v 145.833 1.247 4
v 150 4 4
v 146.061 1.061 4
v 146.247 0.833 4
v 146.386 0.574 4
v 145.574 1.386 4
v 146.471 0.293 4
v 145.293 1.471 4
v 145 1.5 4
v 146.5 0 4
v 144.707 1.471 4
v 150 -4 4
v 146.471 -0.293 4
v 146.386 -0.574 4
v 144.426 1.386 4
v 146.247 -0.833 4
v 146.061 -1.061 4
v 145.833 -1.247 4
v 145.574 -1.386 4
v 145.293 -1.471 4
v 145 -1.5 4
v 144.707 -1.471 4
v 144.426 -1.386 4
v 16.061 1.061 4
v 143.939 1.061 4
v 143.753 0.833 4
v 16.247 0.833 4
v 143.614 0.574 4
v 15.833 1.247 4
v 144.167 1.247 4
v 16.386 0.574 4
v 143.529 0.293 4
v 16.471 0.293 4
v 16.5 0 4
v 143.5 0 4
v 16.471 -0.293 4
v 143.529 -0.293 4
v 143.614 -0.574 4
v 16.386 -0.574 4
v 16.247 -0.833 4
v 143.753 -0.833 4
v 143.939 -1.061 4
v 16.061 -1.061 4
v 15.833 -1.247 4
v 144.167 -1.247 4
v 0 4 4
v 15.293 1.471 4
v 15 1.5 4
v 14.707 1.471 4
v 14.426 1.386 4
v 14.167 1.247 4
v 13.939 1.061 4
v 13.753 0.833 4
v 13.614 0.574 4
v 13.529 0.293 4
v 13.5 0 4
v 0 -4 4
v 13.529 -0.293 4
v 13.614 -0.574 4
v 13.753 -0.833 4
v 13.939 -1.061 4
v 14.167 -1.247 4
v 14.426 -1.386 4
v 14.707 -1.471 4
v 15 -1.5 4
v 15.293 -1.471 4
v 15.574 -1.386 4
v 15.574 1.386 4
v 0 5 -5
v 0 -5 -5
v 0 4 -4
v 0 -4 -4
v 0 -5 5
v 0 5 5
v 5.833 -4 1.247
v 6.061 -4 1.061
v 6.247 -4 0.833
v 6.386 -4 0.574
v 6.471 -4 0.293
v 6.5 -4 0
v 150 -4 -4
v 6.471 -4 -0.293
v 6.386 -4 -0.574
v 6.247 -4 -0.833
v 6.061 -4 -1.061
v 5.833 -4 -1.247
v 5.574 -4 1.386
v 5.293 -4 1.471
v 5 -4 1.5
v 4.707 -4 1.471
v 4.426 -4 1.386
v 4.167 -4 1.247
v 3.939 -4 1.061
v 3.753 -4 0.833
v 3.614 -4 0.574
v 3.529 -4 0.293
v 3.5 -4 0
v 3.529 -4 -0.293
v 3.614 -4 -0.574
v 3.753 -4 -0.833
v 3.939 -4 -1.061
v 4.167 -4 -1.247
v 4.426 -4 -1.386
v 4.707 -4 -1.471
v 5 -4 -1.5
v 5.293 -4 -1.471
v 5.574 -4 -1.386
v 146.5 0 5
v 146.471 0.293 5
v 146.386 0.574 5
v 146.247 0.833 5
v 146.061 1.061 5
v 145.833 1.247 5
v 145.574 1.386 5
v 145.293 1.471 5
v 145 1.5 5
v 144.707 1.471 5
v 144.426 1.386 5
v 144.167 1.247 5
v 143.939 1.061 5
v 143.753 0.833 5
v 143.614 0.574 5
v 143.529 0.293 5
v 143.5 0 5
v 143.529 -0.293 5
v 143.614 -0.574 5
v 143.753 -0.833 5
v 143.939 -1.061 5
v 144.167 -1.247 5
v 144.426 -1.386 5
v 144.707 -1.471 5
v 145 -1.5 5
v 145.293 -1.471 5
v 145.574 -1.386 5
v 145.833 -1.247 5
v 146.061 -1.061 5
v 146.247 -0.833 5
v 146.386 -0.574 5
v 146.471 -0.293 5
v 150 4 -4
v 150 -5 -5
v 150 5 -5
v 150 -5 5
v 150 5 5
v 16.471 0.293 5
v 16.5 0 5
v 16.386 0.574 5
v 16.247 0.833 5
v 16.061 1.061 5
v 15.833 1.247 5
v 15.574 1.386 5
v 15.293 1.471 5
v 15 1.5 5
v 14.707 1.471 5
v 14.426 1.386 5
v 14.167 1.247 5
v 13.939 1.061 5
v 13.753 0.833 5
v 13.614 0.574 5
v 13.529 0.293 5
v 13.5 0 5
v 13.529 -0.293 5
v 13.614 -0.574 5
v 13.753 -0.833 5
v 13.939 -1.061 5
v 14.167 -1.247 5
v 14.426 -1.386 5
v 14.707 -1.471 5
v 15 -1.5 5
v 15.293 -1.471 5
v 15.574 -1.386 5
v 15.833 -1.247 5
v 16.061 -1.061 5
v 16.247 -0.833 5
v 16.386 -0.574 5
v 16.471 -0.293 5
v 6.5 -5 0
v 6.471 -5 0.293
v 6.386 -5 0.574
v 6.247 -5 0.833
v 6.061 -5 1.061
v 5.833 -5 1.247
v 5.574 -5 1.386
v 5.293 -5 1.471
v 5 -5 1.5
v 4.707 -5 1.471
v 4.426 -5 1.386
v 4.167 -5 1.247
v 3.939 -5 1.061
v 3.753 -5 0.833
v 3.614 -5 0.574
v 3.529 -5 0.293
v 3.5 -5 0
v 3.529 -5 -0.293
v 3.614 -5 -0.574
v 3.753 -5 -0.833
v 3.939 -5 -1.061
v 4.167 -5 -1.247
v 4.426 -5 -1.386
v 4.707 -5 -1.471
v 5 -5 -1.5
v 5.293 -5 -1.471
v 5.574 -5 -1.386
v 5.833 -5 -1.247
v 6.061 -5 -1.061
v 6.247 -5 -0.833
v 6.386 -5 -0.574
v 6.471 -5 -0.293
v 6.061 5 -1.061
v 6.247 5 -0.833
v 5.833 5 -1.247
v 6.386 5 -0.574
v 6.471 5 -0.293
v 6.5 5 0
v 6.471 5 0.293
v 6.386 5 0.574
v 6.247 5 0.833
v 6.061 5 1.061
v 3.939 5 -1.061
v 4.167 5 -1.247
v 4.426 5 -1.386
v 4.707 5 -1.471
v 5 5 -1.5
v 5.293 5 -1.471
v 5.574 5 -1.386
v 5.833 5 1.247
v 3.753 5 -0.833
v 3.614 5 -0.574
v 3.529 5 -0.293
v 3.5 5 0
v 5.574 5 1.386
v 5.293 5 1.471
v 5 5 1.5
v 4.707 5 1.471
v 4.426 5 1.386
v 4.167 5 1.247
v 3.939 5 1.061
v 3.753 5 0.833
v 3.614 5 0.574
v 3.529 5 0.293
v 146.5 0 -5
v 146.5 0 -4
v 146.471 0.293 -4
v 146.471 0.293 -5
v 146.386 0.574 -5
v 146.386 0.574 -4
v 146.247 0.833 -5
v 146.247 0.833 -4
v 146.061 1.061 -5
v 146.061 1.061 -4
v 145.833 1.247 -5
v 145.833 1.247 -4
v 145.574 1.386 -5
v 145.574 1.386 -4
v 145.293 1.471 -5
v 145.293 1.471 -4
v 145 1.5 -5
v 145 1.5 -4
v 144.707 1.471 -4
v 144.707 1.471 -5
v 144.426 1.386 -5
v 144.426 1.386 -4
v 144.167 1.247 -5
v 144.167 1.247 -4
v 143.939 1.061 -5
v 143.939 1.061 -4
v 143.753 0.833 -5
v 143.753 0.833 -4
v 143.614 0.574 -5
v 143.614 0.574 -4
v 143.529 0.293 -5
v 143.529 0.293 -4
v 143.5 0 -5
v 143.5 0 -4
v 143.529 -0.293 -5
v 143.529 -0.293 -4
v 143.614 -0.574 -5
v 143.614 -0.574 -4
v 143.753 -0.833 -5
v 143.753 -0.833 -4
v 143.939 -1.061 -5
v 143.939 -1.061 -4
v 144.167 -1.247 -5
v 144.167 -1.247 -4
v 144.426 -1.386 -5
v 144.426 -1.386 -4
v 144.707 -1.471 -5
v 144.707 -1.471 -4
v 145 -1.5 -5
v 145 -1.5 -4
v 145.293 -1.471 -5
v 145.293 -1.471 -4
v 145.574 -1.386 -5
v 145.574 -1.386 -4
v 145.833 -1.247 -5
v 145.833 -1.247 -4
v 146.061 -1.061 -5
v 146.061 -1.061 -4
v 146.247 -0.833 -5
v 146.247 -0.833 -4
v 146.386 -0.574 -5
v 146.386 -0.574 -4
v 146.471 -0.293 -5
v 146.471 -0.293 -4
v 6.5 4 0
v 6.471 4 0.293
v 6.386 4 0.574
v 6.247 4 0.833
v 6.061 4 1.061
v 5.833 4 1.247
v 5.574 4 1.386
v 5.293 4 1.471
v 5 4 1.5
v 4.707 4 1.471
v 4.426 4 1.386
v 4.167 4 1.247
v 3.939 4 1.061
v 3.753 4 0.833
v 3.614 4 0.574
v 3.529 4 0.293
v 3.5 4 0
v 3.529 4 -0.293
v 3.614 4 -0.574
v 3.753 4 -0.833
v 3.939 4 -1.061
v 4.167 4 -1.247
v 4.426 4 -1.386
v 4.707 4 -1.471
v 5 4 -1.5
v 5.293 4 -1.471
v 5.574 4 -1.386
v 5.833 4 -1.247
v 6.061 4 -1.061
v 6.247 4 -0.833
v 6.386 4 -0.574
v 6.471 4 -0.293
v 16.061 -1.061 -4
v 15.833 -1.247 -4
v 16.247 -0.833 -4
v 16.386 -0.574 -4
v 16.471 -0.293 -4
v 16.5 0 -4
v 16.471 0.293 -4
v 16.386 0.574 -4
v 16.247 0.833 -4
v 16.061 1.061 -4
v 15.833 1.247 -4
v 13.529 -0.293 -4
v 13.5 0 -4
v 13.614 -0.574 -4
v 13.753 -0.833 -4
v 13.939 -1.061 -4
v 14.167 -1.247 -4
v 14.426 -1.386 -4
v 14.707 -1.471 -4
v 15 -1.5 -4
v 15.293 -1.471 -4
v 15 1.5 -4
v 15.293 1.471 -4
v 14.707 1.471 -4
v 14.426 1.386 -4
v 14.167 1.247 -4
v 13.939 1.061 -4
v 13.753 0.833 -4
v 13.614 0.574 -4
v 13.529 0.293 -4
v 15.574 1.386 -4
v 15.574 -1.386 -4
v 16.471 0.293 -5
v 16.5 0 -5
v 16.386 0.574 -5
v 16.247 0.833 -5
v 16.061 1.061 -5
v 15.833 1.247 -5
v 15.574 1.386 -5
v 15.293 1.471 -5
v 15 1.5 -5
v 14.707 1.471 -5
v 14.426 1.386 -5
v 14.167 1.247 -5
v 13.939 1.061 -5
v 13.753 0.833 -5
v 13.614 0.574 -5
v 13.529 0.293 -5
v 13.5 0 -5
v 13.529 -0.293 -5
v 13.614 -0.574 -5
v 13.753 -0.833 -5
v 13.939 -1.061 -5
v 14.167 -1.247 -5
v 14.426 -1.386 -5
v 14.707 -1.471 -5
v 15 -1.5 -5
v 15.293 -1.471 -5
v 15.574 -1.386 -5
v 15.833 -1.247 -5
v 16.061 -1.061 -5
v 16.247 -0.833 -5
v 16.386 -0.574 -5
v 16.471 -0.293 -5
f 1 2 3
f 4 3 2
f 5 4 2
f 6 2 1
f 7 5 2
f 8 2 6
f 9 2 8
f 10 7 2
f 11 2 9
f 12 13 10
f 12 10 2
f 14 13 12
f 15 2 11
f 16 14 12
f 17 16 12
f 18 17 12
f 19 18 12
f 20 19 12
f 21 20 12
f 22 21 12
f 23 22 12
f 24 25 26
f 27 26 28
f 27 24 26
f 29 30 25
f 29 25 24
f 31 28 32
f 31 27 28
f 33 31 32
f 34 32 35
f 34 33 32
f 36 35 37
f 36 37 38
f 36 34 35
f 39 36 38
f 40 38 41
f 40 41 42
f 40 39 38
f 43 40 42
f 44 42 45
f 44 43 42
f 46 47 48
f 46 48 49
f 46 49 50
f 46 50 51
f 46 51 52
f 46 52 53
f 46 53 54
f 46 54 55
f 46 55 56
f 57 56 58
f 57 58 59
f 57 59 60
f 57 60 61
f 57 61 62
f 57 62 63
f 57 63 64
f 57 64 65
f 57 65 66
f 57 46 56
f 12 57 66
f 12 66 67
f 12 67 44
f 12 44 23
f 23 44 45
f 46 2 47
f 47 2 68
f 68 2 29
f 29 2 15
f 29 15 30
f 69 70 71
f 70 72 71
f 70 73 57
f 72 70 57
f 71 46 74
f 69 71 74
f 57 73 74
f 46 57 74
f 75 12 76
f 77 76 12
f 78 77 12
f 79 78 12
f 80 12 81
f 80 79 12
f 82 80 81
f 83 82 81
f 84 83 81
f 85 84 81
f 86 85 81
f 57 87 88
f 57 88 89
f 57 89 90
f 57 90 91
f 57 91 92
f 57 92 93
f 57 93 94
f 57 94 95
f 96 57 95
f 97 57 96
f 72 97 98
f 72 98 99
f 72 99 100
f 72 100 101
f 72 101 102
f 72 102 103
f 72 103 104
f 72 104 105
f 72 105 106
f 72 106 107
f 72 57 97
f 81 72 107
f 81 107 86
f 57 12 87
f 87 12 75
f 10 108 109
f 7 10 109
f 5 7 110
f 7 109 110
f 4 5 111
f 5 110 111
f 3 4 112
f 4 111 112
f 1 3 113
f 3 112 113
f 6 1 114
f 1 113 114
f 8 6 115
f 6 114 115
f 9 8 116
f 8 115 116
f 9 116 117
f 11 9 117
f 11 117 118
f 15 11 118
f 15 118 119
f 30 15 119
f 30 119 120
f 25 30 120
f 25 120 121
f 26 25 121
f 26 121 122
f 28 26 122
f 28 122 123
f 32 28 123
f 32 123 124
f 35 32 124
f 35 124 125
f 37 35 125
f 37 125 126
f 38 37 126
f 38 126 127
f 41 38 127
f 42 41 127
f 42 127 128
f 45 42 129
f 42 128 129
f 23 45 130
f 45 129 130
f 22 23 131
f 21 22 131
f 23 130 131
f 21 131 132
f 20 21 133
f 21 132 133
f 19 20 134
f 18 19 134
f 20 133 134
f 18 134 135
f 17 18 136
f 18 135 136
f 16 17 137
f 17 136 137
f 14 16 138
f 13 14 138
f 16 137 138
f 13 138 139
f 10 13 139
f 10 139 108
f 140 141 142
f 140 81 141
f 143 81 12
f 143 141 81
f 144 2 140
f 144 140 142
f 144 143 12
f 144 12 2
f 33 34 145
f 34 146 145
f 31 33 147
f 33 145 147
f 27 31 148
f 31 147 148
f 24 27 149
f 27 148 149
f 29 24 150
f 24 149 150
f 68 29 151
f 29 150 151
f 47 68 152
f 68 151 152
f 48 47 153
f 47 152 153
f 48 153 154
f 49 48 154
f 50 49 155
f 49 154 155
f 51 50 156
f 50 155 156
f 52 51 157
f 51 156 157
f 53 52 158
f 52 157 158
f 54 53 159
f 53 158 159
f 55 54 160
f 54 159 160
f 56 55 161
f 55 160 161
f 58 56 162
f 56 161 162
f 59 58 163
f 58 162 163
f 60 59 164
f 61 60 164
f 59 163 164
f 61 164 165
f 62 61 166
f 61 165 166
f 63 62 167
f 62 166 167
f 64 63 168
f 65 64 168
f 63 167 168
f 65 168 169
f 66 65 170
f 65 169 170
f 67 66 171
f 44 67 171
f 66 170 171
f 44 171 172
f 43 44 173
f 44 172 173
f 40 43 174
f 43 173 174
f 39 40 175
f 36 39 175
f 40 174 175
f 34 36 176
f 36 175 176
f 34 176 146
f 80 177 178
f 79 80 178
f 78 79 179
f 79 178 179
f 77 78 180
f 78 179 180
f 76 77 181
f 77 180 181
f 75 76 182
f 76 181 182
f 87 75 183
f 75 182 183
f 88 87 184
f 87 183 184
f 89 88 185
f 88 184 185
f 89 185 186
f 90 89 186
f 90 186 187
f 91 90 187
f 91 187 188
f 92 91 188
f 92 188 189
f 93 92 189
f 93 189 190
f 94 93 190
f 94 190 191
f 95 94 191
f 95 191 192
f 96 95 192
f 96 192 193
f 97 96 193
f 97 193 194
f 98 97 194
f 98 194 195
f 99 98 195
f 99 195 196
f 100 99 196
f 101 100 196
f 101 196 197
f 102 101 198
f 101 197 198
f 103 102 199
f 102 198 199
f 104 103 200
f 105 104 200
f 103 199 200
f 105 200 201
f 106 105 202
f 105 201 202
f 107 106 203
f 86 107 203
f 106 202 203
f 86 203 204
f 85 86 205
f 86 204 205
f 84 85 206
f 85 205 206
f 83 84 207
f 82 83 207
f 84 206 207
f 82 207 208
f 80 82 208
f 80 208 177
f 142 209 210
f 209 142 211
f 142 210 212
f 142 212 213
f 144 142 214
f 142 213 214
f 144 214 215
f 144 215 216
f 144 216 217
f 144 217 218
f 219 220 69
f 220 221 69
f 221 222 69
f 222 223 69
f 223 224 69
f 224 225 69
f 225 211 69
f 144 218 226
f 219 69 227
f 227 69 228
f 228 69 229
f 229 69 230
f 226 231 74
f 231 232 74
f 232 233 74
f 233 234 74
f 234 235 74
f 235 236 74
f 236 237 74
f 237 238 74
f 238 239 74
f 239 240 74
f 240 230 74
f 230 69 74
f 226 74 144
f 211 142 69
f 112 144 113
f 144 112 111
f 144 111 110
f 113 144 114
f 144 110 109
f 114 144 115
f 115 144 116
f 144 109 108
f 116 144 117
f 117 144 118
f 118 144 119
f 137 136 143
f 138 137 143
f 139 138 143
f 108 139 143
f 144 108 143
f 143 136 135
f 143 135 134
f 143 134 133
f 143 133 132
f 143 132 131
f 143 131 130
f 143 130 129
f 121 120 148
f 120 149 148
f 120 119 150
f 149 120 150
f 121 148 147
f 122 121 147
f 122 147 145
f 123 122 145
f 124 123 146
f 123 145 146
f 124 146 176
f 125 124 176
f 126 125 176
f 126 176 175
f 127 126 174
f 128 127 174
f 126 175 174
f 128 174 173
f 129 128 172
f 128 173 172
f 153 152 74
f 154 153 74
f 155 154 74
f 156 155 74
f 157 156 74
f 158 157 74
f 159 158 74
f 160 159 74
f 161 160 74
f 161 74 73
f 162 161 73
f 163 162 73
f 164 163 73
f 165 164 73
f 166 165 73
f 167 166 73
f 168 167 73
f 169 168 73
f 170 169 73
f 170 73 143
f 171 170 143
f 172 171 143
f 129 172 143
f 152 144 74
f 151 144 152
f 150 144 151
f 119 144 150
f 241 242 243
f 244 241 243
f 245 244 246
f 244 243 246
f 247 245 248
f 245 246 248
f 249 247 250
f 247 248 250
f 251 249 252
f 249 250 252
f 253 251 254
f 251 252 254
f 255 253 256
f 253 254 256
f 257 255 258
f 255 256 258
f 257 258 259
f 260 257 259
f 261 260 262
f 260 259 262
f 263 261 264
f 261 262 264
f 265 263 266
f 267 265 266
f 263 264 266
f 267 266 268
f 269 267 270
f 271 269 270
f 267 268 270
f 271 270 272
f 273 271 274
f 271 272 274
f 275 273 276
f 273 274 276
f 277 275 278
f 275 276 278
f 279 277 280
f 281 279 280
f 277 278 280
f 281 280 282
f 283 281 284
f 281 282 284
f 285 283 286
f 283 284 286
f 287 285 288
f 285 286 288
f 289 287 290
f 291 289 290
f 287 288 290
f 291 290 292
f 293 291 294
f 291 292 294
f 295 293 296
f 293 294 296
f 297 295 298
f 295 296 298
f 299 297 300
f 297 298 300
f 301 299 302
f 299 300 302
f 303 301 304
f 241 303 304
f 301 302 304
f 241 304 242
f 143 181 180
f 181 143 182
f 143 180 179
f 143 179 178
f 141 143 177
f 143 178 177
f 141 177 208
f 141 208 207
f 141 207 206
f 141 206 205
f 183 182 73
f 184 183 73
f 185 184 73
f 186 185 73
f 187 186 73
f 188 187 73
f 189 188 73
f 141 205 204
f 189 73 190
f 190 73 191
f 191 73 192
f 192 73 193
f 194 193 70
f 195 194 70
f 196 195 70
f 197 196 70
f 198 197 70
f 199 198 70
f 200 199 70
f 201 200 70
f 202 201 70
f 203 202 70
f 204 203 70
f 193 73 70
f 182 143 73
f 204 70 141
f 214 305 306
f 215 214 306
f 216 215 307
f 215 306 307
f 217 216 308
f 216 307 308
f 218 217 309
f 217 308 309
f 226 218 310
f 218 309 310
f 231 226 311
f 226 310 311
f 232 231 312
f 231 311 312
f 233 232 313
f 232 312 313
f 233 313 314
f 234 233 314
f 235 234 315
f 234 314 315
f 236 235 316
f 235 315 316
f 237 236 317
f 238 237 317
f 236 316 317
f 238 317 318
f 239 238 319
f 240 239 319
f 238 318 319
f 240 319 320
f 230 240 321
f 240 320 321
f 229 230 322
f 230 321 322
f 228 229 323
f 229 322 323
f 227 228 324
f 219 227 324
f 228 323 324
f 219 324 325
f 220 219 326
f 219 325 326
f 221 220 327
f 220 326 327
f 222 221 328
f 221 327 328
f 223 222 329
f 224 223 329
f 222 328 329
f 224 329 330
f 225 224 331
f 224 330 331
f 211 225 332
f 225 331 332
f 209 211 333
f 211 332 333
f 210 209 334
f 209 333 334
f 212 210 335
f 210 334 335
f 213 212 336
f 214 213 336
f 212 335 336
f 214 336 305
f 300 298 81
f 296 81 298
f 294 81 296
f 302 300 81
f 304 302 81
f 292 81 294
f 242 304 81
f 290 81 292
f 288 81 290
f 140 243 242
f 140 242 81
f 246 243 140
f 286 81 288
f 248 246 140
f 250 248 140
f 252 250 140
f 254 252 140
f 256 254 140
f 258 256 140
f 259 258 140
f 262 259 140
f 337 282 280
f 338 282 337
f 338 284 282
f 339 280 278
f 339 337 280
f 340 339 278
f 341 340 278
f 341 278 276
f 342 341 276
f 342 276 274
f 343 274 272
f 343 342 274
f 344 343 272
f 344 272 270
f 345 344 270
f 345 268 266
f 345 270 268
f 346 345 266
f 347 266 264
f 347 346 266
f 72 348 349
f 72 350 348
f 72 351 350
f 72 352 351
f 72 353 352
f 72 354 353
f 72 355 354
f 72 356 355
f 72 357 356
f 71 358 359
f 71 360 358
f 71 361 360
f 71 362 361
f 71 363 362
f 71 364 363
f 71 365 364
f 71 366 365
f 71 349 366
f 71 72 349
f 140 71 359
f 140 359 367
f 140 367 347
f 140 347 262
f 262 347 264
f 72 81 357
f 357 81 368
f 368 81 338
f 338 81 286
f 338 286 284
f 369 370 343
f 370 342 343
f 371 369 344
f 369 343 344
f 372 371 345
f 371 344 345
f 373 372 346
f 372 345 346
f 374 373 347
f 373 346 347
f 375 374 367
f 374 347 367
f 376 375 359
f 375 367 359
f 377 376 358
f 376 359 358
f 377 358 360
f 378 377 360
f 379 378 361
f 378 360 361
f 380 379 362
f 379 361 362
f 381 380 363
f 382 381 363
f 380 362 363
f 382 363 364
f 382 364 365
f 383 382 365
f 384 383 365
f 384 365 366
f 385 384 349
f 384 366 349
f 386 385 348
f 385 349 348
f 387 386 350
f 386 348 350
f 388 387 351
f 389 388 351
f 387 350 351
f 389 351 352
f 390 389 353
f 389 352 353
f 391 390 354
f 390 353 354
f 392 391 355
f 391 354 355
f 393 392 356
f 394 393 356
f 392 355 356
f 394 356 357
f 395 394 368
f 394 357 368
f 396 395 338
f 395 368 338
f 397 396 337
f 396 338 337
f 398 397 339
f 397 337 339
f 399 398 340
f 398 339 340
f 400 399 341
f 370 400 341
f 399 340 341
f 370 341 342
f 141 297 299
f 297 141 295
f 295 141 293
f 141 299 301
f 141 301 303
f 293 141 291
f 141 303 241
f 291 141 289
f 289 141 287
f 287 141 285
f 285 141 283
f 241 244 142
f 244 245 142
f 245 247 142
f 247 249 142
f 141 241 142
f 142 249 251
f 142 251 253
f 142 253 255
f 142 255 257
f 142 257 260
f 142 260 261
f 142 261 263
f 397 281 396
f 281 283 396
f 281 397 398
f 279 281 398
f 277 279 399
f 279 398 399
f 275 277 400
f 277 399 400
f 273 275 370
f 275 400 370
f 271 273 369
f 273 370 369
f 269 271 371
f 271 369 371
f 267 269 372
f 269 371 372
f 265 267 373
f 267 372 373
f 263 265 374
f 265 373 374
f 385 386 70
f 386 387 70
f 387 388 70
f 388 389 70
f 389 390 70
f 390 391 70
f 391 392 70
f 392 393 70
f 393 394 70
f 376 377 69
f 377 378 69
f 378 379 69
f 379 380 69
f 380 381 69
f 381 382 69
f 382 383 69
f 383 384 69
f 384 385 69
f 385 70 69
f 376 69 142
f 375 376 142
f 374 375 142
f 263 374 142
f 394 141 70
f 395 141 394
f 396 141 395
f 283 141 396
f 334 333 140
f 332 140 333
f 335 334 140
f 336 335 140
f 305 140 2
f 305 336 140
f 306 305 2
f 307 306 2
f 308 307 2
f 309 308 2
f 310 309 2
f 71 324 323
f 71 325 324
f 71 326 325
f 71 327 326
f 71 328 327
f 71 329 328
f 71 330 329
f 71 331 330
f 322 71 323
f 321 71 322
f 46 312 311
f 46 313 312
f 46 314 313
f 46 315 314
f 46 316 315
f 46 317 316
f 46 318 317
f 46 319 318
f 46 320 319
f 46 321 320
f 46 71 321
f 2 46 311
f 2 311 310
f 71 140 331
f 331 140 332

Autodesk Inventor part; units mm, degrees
ref_plane "YZ Plane" through (0, 0, 0) normal (1, 0, 0) x (0, 1, 0)
ref_plane "XZ Plane" through (0, 0, 0) normal (0, 1, 0) x (-1, 0, 0)
ref_plane "XY Plane" through (0, 0, 0) normal (0, 0, 1) x (1, 0, 0)
sketch "スケッチ1" plane through (0, 0, 0) normal (1, 0, 0) x (0, 1, 0)
  line L0 (5, 5) -> (-5, 5)
  line L1 (-5, 5) -> (-5, -5)
  line L2 (-5, -5) -> (5, -5)
  line L3 (5, -5) -> (5, 5)
  line L4 (4, 4) -> (-4, 4)
  line L5 (-4, 4) -> (-4, -4)
  line L6 (-4, -4) -> (4, -4)
  line L7 (4, -4) -> (4, 4)
  point P0 (0, 0)
  dimension "d0" = 1
  dimension "d1" = 1
  dimension "d2" = 1
  dimension "d3" = 1
  dimension "d4" = 10
  dimension "d5" = 10
  dimension "d6" = 5
  dimension "d7" = 5
extrude "押し出し1" add sketch "スケッチ1" along normal blind 150
sketch "スケッチ2" plane through (0, -5, 5) normal (0, 0, 1) x (1, 0, 0)
  circle A0 centre (15, 5) radius 1.5
  line L0 (0, 10) -> (0, 0) projected
  line L1 (0, 0) -> (150, 0) projected
  circle A1 centre (145, 5) radius 1.5
  line L2 (150, 10) -> (150, 0) projected
  point P0 (0, 5)
  dimension "d10" = 3
  dimension "d11" = 15
  dimension "d12" = 5
  dimension "d13" = 5
  dimension "d14" = 5
  dimension "d15" = 3
sketch "スケッチ3" plane through (0, -5, -5) normal (0, -1, 0) x (1, 0, 0)
  circle A0 centre (5, 5) radius 1.5
  line L0 (0, 10) -> (0, 0) projected
  line L1 (0, 0) -> (150, 0) projected
  point P0 (0, 5)
  dimension "d16" = 3
  dimension "d17" = 5
  dimension "d18" = 5
extrude "押し出し2" cut sketch "スケッチ3" against normal blind 15
extrude "押し出し3" cut sketch "スケッチ2" against normal blind 15
properties part number "backparts1" material "アルミニウム 6061"
